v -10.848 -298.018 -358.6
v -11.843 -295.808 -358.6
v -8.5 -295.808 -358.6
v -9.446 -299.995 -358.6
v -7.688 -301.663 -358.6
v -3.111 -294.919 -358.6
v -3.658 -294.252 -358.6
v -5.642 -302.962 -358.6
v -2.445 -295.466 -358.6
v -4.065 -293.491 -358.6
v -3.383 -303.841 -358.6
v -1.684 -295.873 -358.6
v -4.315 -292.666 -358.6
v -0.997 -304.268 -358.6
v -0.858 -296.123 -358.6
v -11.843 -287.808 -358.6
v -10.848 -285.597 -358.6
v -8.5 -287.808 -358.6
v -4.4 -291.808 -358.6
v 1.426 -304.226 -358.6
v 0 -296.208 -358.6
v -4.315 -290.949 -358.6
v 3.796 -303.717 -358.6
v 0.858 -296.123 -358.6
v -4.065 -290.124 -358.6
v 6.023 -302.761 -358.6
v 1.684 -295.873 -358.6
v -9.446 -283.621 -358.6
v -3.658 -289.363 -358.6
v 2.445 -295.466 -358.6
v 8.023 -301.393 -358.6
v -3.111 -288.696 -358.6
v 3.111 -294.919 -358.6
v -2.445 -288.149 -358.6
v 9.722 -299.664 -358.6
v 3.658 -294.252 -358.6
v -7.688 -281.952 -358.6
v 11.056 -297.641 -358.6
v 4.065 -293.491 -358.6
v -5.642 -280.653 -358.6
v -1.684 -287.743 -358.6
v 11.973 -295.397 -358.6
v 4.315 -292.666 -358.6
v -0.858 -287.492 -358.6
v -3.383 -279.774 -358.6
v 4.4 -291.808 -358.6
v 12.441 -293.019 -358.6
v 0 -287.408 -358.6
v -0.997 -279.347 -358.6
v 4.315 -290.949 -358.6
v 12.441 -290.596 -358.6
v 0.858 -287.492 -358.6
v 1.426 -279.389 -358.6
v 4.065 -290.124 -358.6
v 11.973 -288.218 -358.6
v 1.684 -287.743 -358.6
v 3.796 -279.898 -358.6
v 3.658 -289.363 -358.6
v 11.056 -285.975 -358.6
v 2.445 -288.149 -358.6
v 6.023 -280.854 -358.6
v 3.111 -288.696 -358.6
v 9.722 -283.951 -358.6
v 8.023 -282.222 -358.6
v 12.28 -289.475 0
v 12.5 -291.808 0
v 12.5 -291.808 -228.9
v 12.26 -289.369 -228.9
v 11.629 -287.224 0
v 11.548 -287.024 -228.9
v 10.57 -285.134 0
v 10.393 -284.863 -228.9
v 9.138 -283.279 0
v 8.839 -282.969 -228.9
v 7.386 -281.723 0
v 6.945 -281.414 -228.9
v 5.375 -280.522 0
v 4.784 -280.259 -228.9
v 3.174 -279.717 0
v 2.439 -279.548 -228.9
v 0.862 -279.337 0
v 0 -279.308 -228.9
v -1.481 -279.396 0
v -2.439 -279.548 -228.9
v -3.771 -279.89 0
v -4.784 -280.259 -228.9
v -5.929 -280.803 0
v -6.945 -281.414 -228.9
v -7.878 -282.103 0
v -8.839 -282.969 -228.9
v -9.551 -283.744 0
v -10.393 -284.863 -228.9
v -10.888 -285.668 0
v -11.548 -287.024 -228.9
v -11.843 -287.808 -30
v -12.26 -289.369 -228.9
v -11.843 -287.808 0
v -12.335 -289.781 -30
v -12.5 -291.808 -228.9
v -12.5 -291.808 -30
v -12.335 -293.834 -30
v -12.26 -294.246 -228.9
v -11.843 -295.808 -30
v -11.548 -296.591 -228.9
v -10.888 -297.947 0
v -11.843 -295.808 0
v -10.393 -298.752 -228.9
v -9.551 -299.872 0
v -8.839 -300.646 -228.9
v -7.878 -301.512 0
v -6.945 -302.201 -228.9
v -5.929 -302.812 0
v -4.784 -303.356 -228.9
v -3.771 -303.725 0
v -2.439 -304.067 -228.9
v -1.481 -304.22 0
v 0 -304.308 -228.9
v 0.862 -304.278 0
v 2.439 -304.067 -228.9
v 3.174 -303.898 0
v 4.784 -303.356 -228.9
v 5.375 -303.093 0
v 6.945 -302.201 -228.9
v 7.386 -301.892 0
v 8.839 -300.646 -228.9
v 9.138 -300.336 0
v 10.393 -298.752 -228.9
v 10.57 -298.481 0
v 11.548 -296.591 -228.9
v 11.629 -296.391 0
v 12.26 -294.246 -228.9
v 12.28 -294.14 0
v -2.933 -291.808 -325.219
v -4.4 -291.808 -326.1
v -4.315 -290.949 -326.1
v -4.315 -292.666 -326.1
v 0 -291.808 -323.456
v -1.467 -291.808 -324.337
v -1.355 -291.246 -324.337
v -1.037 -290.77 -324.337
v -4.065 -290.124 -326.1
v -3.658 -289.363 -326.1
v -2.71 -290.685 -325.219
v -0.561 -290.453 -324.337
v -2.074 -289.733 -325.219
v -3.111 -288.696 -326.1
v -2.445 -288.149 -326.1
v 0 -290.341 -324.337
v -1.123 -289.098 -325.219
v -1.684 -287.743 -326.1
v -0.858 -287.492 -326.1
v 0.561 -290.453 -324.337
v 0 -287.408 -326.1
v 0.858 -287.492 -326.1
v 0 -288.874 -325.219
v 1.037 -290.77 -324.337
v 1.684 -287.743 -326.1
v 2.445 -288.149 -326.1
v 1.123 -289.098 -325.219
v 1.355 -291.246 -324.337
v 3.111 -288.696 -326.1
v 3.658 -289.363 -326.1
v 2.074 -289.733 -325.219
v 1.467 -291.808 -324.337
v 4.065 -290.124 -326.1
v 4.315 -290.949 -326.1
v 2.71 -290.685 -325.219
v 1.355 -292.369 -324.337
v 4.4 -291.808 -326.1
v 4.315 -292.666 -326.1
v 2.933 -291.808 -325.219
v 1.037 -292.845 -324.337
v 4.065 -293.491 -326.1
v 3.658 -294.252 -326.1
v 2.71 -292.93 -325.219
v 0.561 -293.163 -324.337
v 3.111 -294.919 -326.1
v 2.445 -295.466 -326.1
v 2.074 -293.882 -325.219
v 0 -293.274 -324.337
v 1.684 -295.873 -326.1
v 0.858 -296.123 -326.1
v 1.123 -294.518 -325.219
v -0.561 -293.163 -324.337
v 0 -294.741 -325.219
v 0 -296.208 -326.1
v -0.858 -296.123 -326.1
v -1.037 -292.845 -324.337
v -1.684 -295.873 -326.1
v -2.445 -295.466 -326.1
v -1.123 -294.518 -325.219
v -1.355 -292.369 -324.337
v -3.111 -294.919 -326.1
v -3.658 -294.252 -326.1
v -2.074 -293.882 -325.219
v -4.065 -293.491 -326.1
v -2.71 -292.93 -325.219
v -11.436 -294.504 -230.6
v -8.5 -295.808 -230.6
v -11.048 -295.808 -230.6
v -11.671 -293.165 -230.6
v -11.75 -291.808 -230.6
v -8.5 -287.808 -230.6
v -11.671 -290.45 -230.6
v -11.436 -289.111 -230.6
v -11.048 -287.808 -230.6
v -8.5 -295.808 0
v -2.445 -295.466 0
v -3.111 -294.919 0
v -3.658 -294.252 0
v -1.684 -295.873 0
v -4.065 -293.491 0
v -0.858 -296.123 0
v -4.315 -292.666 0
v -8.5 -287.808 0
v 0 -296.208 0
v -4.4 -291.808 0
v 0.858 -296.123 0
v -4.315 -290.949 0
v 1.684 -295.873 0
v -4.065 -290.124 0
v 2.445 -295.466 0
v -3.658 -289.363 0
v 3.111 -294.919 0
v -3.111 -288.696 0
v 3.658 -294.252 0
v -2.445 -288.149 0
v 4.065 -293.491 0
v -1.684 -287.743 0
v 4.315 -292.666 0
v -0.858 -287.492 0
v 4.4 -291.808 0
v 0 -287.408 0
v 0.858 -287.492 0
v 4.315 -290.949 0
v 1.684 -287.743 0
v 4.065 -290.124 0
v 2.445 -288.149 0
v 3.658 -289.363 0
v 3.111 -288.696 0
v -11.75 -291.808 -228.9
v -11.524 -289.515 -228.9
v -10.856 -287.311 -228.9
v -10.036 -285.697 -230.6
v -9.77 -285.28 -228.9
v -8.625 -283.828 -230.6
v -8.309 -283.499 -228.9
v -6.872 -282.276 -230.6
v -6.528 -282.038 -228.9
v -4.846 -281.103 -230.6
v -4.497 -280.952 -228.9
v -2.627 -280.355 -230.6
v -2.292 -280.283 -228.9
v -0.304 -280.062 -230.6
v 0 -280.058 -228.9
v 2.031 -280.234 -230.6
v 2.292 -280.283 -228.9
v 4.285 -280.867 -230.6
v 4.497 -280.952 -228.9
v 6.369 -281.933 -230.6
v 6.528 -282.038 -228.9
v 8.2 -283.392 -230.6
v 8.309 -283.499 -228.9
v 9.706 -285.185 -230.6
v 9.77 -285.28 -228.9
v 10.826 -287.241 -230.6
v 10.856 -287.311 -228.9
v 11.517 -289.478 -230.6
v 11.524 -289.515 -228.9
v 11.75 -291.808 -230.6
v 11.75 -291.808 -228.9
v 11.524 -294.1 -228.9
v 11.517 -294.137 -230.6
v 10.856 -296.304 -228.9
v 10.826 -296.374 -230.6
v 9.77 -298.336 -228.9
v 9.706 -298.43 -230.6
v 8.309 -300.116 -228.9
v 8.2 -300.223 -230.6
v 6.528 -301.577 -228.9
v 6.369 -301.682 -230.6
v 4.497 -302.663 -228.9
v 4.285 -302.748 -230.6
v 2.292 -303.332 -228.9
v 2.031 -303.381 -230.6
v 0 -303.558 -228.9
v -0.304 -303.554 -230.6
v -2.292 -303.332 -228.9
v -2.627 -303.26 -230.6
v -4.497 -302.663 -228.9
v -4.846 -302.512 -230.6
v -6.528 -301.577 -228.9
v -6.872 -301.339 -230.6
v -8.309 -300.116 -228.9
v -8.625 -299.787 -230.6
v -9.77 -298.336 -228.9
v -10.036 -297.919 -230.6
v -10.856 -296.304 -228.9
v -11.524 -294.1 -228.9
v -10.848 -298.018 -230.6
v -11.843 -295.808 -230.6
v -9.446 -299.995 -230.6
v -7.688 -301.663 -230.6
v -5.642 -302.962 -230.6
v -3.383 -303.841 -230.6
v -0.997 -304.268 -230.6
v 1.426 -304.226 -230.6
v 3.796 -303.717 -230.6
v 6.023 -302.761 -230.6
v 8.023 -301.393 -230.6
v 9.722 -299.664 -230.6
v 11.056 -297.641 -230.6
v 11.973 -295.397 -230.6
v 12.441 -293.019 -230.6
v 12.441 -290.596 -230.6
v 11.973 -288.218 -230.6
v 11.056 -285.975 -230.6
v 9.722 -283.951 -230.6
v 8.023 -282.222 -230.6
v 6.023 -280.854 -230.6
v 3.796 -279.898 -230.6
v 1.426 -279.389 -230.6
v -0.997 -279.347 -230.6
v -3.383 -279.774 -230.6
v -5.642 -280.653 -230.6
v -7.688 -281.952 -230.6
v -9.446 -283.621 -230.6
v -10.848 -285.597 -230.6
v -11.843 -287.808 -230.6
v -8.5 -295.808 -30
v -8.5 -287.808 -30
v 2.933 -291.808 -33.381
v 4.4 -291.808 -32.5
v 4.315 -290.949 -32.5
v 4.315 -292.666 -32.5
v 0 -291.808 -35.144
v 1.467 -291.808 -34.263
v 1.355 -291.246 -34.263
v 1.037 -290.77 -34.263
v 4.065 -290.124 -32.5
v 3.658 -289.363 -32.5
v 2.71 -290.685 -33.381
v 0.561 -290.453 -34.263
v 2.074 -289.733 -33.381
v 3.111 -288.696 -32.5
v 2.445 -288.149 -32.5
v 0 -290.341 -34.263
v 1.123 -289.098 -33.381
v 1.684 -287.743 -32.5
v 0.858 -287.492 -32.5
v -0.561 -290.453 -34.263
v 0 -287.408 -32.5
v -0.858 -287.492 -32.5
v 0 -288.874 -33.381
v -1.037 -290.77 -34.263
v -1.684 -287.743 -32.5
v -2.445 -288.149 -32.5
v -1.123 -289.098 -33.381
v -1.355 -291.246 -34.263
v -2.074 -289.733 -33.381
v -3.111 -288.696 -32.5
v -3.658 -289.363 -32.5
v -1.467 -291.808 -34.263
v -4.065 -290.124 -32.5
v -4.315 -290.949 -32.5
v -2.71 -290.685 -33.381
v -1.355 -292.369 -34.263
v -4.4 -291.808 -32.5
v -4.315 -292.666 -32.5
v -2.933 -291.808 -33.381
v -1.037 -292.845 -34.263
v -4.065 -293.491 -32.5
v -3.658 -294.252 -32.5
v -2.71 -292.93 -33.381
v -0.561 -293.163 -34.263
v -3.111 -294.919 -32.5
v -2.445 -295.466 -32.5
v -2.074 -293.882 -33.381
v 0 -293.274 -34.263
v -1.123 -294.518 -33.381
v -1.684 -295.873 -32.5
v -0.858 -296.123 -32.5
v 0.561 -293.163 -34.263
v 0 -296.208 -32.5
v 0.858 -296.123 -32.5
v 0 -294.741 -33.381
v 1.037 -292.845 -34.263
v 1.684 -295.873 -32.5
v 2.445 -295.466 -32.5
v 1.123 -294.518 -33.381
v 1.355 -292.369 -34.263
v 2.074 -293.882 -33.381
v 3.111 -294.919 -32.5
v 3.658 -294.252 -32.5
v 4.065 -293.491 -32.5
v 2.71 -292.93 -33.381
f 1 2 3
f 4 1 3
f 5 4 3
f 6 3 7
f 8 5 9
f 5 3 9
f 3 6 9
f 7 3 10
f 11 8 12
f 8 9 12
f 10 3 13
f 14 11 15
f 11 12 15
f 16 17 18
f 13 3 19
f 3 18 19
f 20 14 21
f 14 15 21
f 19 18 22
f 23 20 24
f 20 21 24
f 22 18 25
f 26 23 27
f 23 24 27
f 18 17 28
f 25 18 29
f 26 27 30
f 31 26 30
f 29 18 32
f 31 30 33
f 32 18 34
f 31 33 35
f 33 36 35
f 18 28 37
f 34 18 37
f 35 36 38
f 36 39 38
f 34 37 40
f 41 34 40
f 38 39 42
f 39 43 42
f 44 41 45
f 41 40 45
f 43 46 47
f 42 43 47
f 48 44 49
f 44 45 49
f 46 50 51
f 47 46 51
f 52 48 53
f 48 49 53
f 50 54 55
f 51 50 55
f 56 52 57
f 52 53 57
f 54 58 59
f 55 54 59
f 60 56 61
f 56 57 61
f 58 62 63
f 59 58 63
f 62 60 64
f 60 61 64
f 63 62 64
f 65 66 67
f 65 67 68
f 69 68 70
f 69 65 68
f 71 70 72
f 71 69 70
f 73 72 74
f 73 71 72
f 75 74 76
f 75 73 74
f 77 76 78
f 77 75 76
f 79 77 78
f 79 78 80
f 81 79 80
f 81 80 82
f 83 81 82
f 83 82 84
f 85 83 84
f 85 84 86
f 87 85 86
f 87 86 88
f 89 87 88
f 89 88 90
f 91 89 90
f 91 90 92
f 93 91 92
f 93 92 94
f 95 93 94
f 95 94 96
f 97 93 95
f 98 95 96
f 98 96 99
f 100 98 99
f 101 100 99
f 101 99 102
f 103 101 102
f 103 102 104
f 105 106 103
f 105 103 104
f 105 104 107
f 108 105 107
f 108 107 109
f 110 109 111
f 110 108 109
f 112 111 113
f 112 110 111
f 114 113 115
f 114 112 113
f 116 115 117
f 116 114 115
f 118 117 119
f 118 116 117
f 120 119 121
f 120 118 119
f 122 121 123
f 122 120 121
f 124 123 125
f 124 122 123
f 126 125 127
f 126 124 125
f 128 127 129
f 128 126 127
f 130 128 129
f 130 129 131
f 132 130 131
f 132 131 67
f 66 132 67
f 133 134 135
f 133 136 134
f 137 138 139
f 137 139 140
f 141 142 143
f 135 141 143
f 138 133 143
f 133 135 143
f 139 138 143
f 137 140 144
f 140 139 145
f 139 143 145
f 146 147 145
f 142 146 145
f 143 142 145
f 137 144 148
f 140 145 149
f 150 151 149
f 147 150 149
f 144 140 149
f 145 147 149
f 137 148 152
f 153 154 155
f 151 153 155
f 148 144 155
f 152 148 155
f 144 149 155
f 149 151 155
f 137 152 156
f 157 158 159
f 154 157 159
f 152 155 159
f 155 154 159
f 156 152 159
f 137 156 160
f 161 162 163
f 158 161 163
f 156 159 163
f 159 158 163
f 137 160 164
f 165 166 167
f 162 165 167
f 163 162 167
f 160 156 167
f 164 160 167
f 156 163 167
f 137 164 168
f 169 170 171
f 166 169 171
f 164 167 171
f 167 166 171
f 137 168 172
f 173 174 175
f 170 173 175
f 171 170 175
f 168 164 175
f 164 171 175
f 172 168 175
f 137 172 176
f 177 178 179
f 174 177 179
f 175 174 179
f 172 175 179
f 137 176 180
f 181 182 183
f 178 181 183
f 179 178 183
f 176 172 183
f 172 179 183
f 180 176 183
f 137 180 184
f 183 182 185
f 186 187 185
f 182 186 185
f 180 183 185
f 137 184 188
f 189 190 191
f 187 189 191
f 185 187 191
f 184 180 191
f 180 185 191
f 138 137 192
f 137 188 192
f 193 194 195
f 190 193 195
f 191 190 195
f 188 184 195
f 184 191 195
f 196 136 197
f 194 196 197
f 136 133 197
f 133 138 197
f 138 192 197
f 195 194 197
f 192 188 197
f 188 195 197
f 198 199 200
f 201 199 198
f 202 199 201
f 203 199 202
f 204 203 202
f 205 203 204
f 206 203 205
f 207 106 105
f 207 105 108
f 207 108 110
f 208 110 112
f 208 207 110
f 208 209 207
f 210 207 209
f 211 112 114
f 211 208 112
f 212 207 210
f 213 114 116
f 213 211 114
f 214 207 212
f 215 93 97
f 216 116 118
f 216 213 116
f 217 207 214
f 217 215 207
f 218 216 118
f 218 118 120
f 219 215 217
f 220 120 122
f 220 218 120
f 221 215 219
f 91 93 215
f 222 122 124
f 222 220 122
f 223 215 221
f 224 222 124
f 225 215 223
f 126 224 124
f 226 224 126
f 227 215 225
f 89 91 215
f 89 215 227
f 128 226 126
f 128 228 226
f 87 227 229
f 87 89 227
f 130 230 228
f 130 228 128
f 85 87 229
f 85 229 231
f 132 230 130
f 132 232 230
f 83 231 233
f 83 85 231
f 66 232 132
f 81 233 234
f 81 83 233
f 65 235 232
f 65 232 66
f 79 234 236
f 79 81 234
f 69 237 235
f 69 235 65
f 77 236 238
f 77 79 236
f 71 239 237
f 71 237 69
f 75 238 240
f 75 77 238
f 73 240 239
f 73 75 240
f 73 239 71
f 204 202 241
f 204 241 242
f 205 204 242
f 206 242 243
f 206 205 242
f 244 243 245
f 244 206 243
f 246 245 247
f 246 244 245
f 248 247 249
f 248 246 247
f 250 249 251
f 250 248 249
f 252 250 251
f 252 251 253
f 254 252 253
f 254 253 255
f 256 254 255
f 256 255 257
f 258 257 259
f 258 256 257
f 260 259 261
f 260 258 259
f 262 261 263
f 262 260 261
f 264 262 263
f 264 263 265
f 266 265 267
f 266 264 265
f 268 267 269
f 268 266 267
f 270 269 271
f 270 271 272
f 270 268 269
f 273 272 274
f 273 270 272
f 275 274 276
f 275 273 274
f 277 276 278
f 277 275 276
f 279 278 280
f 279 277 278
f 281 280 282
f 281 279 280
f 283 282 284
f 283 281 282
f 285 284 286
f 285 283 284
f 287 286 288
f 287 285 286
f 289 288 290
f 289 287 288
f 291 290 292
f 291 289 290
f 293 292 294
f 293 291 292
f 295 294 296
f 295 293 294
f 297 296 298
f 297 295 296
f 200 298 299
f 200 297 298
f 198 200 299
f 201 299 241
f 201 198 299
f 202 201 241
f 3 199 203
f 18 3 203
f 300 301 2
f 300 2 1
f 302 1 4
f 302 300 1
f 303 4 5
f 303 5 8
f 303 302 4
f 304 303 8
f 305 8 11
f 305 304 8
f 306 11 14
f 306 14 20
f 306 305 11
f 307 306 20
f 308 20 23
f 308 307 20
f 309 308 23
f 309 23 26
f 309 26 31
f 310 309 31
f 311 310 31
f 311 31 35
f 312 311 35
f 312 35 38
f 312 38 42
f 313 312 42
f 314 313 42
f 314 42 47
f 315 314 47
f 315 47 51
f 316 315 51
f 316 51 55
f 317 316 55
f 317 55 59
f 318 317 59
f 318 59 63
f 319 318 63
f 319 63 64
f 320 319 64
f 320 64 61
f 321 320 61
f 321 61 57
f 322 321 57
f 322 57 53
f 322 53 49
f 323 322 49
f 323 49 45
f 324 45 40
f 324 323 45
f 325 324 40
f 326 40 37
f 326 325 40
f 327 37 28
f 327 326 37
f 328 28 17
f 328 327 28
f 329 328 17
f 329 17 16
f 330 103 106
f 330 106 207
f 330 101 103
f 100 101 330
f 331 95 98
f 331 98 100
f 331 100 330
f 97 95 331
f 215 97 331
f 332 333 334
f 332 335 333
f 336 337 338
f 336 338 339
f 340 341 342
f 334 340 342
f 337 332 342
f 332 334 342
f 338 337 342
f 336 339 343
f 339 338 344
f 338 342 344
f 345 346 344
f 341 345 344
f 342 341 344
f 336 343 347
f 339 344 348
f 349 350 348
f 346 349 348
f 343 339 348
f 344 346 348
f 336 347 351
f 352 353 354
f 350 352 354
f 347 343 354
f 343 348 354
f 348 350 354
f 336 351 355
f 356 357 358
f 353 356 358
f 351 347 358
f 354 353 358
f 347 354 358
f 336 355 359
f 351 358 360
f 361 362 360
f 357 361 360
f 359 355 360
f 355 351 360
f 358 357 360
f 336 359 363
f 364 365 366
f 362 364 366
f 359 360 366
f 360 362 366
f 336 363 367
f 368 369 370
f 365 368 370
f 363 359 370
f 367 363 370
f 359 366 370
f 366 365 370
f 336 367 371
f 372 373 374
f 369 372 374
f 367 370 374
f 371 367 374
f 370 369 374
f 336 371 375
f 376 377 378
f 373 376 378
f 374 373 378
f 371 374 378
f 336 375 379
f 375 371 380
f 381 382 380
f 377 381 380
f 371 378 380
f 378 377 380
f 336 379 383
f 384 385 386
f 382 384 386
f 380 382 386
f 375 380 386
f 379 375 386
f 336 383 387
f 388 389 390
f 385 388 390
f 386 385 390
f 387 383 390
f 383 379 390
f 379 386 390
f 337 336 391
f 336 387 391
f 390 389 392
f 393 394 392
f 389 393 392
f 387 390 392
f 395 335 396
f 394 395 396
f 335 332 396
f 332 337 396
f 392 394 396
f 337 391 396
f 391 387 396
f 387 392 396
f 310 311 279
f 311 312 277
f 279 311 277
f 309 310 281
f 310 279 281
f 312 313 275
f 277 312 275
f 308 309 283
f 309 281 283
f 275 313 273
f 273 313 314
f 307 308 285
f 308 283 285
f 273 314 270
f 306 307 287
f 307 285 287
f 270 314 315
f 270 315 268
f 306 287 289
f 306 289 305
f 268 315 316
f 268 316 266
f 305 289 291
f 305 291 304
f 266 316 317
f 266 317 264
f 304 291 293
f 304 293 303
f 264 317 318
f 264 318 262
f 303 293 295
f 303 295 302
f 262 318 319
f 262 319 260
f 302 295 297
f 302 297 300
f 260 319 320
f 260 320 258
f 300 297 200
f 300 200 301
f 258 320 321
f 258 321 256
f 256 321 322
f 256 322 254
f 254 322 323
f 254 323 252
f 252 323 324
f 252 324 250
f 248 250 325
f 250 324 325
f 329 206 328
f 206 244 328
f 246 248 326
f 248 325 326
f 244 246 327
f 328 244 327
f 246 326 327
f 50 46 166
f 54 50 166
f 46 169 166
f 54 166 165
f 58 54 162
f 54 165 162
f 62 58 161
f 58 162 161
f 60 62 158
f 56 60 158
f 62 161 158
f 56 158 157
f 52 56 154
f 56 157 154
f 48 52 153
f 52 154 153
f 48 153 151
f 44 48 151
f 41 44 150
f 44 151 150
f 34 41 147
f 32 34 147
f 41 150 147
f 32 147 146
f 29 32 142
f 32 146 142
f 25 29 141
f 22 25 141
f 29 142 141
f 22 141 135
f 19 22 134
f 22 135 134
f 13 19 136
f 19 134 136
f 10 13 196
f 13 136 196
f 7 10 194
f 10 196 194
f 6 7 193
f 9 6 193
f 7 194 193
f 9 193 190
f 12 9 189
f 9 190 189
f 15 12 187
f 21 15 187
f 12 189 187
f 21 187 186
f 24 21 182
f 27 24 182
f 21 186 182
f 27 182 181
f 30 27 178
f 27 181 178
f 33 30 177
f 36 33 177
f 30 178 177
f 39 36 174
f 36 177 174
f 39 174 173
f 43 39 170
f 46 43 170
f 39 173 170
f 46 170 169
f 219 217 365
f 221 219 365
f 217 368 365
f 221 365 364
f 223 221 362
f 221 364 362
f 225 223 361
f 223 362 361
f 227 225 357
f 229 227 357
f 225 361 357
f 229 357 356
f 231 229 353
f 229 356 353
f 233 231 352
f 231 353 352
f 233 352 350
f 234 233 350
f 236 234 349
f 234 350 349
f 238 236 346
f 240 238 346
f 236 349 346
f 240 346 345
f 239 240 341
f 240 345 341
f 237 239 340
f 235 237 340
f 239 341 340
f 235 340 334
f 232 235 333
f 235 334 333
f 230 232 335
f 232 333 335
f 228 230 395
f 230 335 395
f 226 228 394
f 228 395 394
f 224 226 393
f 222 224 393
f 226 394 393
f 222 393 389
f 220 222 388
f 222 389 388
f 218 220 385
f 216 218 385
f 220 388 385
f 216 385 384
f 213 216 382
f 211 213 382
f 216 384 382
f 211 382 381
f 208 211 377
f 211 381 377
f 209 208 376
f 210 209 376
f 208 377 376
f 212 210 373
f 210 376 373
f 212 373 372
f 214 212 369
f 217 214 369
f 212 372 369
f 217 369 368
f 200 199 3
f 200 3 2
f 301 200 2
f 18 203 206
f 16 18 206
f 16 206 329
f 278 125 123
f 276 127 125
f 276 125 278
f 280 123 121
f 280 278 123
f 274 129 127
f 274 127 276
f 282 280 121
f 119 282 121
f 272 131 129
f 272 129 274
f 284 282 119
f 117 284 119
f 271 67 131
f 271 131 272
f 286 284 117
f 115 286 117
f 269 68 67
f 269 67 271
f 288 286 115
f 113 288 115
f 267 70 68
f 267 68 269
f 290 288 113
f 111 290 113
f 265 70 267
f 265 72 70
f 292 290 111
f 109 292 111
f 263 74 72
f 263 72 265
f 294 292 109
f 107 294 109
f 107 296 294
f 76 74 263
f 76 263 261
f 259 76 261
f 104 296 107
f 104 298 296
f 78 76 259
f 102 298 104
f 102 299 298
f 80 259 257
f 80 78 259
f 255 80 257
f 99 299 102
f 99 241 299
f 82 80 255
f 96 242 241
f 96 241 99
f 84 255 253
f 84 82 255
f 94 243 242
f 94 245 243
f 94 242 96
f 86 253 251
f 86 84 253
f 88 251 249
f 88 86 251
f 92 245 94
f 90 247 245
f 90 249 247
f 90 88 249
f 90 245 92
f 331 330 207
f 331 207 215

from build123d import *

# Parameters (mm, degrees)
SKETCH_1_R          = 12.5
EXTRUDE_1_DEPTH     = 358.6
CUT_EXTRUDE_START   = -30
SKETCH_2_W          = 8
SKETCH_2_H          = 8
CUT_EXTRUDE_1_DEPTH = 30
SKETCH_3_R          = 26
SKETCH_3_R_2        = 11.75
CUT_EXTRUDE_2_DEPTH = 1.7
CUT_EXTRUDE_START_2 = -128
SKETCH_4_W          = 8
SKETCH_4_H          = 8
CUT_EXTRUDE_3_DEPTH = 128
M10X1_252_D         = 8.8
M10X1_252_DEPTH     = 32.5
M10X1_252_TIP       = 2.643786724
M10X1_253_D         = 8.8
M10X1_253_DEPTH     = 32.5
M10X1_253_TIP       = 2.643786724


with BuildPart() as part:
    # Эскиз1 → Бобышка-Вытянуть1 (new body)
    with BuildSketch(Plane.XY):
        with Locations((0, -291.807573628)):
            Circle(SKETCH_1_R)
    extrude(amount=-EXTRUDE_1_DEPTH)

    # Эскиз2 → Вырез-Вытянуть1 (cut)
    with BuildSketch(Plane.XY.offset(CUT_EXTRUDE_START)):
        with Locations((-12.5, -291.807573628)):
            Rectangle(SKETCH_2_W, SKETCH_2_H)
    extrude(amount=CUT_EXTRUDE_1_DEPTH, mode=Mode.SUBTRACT)

    # Эскиз3 → Вырез-Вытянуть2 (cut)
    with BuildSketch(Plane(origin=(0, 0, -230.6), x_dir=(-1, 0, 0), z_dir=(0, 0, -1))):
        with Locations((0, -291.807573628)):
            Circle(SKETCH_3_R)
        with Locations((0, -291.807573628)):
            Circle(SKETCH_3_R_2, mode=Mode.SUBTRACT)
    extrude(amount=-CUT_EXTRUDE_2_DEPTH, mode=Mode.SUBTRACT)

    # Эскиз4 → Вырез-Вытянуть3 (cut)
    with BuildSketch(Plane(origin=(0, 0, -358.6), x_dir=(-1, 0, 0), z_dir=(0, 0, -1)).offset(CUT_EXTRUDE_START_2)):
        with Locations((12.5, -291.807573628)):
            Rectangle(SKETCH_4_W, SKETCH_4_H)
    extrude(amount=CUT_EXTRUDE_3_DEPTH, mode=Mode.SUBTRACT)

    # Сверление под метчик M10x1.252
    with Locations(Plane.XY):
        with Locations((0, -291.807573628)):
            Hole(M10X1_252_D / 2, depth=M10X1_252_DEPTH)
            with Locations((0, 0, -(M10X1_252_DEPTH + M10X1_252_TIP / 2))):  # 118° drill point
                Cone(0, M10X1_252_D / 2, M10X1_252_TIP, mode=Mode.SUBTRACT)

    # Сверление под метчик M10x1.253
    with Locations(Plane(origin=(0, 0, -358.6), x_dir=(-1, 0, 0), z_dir=(0, 0, -1))):
        with Locations((0, -291.807573628)):
            Hole(M10X1_253_D / 2, depth=M10X1_253_DEPTH)
            with Locations((0, 0, -(M10X1_253_DEPTH + M10X1_253_TIP / 2))):  # 118° drill point
                Cone(0, M10X1_253_D / 2, M10X1_253_TIP, mode=Mode.SUBTRACT)


solid = part.part
